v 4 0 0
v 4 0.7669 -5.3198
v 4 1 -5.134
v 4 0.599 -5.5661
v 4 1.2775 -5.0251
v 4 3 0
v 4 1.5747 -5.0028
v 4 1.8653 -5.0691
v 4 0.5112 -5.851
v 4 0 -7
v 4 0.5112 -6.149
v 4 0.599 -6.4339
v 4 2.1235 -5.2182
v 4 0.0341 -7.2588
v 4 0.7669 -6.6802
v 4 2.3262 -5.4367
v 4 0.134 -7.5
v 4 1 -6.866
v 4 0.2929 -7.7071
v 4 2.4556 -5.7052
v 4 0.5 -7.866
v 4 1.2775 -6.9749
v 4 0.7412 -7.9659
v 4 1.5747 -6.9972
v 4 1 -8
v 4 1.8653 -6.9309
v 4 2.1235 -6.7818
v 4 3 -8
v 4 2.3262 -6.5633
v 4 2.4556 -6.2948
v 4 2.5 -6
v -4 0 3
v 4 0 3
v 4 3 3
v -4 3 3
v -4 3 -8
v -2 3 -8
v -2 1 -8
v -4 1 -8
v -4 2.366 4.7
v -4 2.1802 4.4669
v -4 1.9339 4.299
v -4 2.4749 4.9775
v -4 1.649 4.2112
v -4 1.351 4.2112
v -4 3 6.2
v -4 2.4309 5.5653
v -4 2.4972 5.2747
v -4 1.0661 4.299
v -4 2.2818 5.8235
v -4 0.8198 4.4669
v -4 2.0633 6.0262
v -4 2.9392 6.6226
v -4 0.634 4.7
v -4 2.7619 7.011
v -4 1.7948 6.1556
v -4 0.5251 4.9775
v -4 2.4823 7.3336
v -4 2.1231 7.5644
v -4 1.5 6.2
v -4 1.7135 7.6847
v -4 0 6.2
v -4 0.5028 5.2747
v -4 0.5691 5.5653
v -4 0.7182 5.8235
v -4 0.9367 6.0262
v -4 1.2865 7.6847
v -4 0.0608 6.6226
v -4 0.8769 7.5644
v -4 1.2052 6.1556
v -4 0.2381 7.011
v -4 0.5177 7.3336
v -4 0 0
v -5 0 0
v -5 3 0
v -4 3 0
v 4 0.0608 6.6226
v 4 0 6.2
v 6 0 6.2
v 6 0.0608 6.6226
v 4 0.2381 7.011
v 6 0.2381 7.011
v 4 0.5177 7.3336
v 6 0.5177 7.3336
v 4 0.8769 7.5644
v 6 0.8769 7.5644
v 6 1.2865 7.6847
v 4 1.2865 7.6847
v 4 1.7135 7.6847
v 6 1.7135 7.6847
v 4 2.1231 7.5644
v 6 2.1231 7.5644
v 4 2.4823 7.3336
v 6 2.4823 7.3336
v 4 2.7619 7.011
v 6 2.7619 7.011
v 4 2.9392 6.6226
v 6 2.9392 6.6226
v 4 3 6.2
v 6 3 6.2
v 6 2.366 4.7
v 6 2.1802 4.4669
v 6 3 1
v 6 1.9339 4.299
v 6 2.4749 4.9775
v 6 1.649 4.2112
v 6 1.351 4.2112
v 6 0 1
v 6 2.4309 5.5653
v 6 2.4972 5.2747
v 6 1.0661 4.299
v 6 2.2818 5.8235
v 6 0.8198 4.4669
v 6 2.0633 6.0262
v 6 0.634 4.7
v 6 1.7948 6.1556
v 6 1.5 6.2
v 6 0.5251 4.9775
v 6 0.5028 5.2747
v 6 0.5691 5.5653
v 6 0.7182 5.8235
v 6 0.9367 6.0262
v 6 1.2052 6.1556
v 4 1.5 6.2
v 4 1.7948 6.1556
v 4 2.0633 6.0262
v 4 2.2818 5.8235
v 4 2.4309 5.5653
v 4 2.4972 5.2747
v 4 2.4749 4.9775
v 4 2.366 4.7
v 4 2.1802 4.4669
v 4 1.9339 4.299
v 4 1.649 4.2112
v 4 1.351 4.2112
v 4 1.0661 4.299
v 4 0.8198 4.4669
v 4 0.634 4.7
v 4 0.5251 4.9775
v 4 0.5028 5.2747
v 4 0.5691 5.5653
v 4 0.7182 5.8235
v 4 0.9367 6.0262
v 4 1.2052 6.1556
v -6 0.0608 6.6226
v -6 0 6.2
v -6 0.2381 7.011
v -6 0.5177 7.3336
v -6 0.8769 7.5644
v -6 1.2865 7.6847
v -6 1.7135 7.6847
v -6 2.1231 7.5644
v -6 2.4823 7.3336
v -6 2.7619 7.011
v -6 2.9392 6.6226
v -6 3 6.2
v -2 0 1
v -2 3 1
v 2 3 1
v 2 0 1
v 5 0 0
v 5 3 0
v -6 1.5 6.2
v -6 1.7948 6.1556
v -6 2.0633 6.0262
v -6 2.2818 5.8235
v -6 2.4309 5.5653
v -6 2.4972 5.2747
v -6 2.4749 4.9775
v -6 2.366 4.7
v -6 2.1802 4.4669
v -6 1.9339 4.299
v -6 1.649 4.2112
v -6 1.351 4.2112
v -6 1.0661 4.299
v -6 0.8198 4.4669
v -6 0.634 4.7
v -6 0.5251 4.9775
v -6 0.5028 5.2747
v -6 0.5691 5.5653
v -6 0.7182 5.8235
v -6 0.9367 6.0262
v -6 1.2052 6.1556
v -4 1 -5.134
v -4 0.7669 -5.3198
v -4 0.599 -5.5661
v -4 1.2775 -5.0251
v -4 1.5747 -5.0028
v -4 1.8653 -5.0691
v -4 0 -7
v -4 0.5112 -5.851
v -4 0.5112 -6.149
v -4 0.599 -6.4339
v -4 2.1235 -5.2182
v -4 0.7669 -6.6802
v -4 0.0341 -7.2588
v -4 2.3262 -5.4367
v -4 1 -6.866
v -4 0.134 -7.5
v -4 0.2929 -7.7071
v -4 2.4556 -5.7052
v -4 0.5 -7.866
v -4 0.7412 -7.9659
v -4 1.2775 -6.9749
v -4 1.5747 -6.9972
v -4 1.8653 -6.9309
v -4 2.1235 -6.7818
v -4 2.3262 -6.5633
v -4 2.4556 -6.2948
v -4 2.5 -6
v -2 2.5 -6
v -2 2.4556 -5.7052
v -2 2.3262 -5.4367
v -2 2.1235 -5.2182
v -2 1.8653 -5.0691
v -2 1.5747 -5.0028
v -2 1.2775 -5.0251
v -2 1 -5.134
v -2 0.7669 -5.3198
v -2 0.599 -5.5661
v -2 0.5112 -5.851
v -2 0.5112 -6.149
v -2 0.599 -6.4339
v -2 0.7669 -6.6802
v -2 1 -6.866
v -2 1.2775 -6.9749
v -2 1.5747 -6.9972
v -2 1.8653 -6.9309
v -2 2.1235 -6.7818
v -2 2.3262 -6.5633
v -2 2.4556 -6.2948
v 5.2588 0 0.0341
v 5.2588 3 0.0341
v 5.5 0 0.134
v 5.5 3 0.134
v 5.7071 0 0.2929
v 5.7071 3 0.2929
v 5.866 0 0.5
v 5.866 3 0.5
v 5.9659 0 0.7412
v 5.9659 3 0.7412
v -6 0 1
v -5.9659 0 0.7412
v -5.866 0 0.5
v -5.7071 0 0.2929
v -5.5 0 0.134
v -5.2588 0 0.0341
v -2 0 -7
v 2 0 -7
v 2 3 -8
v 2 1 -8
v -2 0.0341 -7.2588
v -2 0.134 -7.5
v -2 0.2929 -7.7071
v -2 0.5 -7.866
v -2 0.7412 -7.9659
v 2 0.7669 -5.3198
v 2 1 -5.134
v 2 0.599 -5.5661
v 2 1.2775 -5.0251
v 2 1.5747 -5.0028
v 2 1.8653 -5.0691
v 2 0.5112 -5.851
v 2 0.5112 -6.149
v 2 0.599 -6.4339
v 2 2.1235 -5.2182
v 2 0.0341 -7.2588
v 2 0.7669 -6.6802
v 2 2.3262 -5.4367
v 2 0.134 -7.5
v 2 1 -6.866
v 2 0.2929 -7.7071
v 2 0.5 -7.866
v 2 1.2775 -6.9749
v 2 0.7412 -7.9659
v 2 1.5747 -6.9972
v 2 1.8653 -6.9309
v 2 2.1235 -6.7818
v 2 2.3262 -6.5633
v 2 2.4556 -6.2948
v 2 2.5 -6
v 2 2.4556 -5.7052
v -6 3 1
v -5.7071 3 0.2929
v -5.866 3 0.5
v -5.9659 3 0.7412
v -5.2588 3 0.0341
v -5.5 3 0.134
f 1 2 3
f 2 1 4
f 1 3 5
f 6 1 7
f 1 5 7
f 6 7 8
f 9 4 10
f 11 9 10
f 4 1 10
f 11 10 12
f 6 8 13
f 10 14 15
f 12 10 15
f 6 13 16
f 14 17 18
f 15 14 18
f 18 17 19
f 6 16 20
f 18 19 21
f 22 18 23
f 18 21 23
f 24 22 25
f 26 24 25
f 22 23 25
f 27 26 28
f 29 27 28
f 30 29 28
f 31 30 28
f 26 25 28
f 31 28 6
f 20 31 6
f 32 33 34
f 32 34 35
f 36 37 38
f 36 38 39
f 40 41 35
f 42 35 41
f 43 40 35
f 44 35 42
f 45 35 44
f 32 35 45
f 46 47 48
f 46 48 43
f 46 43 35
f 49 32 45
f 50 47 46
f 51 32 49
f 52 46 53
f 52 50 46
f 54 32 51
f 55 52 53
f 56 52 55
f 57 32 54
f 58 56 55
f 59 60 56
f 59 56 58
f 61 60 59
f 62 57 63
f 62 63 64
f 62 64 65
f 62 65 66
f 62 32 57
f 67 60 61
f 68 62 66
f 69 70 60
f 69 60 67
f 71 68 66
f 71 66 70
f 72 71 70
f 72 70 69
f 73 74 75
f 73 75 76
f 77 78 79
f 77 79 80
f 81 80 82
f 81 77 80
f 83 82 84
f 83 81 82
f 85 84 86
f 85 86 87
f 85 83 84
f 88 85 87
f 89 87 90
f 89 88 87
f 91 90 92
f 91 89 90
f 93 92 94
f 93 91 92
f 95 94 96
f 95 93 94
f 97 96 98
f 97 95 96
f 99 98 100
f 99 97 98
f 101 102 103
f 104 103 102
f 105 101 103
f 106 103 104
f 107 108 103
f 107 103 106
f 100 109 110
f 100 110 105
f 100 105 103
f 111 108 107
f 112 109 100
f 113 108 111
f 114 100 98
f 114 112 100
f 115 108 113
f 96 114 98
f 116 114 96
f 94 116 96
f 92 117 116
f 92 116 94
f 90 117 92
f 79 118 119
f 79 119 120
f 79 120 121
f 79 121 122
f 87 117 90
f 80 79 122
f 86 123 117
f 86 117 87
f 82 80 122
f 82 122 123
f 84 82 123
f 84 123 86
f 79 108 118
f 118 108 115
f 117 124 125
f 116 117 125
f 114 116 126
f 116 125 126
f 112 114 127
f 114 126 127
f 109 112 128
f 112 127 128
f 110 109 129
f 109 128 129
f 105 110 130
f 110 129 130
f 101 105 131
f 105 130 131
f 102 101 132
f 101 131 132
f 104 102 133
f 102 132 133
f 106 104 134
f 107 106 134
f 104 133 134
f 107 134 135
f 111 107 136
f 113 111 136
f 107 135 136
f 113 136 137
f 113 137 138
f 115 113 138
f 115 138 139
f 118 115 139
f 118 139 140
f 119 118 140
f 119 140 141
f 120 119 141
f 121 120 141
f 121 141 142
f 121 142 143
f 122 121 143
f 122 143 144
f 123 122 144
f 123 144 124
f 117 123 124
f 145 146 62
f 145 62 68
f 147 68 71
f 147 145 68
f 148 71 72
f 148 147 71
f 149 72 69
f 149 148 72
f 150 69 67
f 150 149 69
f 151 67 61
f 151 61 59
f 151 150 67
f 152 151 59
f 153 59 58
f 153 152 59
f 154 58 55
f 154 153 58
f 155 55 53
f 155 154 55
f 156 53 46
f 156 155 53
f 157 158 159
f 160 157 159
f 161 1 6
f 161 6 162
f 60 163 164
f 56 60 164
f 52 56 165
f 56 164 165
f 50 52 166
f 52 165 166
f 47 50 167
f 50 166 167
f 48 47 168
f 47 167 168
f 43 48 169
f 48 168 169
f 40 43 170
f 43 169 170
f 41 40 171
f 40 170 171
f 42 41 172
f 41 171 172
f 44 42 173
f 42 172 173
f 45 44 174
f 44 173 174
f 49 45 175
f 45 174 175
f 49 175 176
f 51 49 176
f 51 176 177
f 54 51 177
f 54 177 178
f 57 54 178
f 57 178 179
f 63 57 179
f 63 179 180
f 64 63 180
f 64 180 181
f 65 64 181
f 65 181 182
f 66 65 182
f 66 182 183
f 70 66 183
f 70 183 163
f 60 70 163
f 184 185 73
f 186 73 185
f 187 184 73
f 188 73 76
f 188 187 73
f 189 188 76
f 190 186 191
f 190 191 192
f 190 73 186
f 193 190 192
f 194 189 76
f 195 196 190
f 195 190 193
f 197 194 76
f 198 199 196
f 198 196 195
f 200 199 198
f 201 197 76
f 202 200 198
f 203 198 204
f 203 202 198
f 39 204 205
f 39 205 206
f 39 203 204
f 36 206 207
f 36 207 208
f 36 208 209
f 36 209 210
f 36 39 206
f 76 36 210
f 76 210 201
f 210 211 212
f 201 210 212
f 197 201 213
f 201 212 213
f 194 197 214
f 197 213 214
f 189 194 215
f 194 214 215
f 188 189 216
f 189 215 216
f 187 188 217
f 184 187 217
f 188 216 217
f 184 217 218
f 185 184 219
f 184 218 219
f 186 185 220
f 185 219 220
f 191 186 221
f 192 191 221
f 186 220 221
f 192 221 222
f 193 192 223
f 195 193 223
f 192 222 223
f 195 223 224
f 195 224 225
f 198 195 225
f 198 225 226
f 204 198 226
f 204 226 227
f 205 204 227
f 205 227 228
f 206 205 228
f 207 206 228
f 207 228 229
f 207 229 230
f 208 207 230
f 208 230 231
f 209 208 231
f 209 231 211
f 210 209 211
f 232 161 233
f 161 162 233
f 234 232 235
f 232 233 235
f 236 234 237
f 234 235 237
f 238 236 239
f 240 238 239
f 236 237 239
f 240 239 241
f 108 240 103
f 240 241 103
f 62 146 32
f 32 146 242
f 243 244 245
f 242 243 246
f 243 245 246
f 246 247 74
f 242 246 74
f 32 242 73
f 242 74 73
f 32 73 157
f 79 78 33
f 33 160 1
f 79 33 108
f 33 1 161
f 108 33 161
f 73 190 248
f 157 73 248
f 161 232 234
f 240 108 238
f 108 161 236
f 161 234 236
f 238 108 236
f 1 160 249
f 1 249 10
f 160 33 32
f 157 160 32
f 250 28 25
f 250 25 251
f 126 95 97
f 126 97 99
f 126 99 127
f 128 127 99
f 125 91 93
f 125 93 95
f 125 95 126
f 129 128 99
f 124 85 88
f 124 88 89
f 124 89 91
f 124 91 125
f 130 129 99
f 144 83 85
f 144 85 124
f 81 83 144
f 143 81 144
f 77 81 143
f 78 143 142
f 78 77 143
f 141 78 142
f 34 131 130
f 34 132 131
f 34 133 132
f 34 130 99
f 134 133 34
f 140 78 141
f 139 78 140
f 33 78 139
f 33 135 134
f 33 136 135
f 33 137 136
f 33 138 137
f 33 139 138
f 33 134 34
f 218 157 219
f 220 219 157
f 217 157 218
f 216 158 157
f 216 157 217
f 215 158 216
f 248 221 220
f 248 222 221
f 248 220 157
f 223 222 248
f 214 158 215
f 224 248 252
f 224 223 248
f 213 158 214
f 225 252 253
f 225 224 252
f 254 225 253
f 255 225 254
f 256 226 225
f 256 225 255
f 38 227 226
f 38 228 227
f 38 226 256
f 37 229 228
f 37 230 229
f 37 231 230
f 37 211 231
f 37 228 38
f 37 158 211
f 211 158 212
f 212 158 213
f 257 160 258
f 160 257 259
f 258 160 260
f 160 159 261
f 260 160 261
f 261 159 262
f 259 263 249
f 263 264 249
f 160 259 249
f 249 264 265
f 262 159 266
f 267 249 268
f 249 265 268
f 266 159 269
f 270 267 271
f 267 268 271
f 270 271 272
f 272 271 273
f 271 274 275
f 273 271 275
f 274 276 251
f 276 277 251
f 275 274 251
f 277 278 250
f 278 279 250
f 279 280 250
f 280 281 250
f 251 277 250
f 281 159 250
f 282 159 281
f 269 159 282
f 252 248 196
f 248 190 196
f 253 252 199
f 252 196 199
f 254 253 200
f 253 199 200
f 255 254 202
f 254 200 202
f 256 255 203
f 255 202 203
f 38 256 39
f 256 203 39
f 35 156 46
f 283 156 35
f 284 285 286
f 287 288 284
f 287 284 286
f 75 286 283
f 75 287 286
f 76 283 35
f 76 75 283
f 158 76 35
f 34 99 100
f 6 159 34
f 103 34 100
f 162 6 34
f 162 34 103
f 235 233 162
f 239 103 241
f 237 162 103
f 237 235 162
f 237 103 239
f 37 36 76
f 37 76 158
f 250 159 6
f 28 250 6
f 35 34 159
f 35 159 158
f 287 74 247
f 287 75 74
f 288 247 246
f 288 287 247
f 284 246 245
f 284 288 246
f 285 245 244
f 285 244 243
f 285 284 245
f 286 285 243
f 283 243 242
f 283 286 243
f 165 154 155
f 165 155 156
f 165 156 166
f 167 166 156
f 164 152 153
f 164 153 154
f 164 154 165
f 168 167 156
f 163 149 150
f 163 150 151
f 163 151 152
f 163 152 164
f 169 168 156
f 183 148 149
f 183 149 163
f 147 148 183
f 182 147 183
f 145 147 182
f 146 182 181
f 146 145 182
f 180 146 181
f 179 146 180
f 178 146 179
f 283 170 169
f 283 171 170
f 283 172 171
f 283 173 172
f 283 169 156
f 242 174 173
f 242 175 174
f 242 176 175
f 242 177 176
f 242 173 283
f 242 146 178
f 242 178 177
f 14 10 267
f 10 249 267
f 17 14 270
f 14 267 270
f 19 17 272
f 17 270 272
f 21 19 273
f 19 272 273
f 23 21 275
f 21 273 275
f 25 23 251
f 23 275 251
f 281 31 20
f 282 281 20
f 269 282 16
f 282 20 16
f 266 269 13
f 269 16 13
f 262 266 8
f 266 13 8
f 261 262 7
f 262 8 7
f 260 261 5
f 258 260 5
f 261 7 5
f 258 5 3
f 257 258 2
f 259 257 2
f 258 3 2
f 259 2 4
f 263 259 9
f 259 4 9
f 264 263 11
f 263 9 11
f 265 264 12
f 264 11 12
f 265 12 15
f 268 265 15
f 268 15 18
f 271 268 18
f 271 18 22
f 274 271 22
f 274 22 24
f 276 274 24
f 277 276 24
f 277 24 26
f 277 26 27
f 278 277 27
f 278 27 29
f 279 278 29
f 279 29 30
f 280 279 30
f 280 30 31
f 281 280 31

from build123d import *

# Parameters (mm, degrees)
EXTRUDE_1_DEPTH     = 3
SKETCH_2_OUTSIDE_W  = 13.724
SKETCH_2_OUTSIDE_H  = 8.024
CUT_EXTRUDE_1_DEPTH = 12
SKETCH_3_R          = 1
CUT_EXTRUDE_2_DEPTH = 12
FILLET_1_R          = 1
SKETCH_4_R          = 0.95
EXTRUDE_2_DEPTH     = 2
SKETCH_5_W          = 8
SKETCH_5_H          = 3
EXTRUDE_3_DEPTH     = 6
SKETCH_6_R          = 1
CUT_EXTRUDE_3_DEPTH = 12
CUT_EXTRUDE_4_DEPTH = 8
FILLET_2_R          = 1
SKETCH_11_W         = 8
SKETCH_11_H         = 3
EXTRUDE_4_DEPTH     = 2
SKETCH_12_W         = 4
SKETCH_12_H         = 4
CUT_EXTRUDE_5_DEPTH = 10


with BuildPart() as part:
    # 草图1 → 凸台-拉伸1 (new body)
    with BuildSketch(Plane(origin=(0, 0, 0), x_dir=(1, 0, 0), z_dir=(0, 1, 0))):
        Polygon((-6, 0), (6, 0), (6, -8.7), (4, -8.7), (4, -3), (-4, -3), (-4, -8.7), (-6, -8.7), align=None)
    extrude(amount=EXTRUDE_1_DEPTH)

    # 草图2 outside → 切除-拉伸1 (cut)
    with BuildSketch(Plane.ZY.offset(6)):
        with Locations((4.35, 1.5)):
            Rectangle(SKETCH_2_OUTSIDE_W, SKETCH_2_OUTSIDE_H)
        with BuildLine():
            Line((6.2, 3), (0, 3))
            Line((0, 3), (0, 0))
            Line((0, 0), (6.2, 0))
            ThreePointArc((6.2, 0), (7.7, 1.5), (6.2, 3))
        make_face(mode=Mode.SUBTRACT)
    extrude(amount=-CUT_EXTRUDE_1_DEPTH, mode=Mode.SUBTRACT)

    # 草图3 → 切除-拉伸2 (cut)
    with BuildSketch(Plane.ZY.offset(6)):
        with Locations((5.2, 1.5)):
            Circle(SKETCH_3_R)
    extrude(amount=-CUT_EXTRUDE_2_DEPTH, mode=Mode.SUBTRACT)

    # 圆角1
    fillet_1_edges = [part.edges().sort_by_distance(p)[0] for p in [
        (-6, 1.5, 0),
        (6, 1.5, 0),
    ]]
    fillet(fillet_1_edges, radius=FILLET_1_R)

    # 草图4 → 凸台-拉伸2 (add)
    with BuildSketch(Plane(origin=(0, 0, 0), x_dir=(-1, 0, 0), z_dir=(0, 0, -1))):
        with Locations(Location((0, 1.5, 0), (0, 0, 180))):
            Circle(SKETCH_4_R)
    extrude(amount=EXTRUDE_2_DEPTH)

    # 草图5 → 凸台-拉伸3 (add)
    with BuildSketch(Plane(origin=(0, 0, -2), x_dir=(-1, 0, 0), z_dir=(0, 0, -1))):
        with Locations((0, 1.5)):
            Rectangle(SKETCH_5_W, SKETCH_5_H)
    extrude(amount=EXTRUDE_3_DEPTH)

    # 草图6 → 切除-拉伸3 (cut)
    with BuildSketch(Plane(origin=(4, 0, 0), x_dir=(0, 0, -1), z_dir=(1, 0, 0))):
        with Locations(Location((6, 1.5, 0), (0, 0, 90))):
            Circle(SKETCH_6_R)
    extrude(amount=-CUT_EXTRUDE_3_DEPTH, mode=Mode.SUBTRACT)

    # 草图8 → 切除-拉伸4 (cut)
    with BuildSketch(Plane(origin=(0, 3, 0), x_dir=(1, 0, 0), z_dir=(0, 1, 0))):
        Polygon((-2, 10), (2, 8), (2, 3), (-2, 3), align=None)
    extrude(amount=-CUT_EXTRUDE_4_DEPTH, mode=Mode.SUBTRACT)

    # 圆角2
    fillet_2_edges = [part.edges().sort_by_distance(p)[0] for p in [
        (-3, 0, -8),
        (3, 0, -8),
    ]]
    fillet(fillet_2_edges, radius=FILLET_2_R)

    # 草图11 → 凸台-拉伸4 (add)
    with BuildSketch(Plane.XY.offset(-2)):
        with Locations((0, 1.5)):
            Rectangle(SKETCH_11_W, SKETCH_11_H)
    extrude(amount=EXTRUDE_4_DEPTH)

    # 草图12 → 切除-拉伸5 (cut)
    with BuildSketch(Plane(origin=(0, 3, 0), x_dir=(1, 0, 0), z_dir=(0, 1, 0))):
        with Locations((0, 1)):
            Rectangle(SKETCH_12_W, SKETCH_12_H)
    extrude(amount=-CUT_EXTRUDE_5_DEPTH, mode=Mode.SUBTRACT)


solid = part.part
